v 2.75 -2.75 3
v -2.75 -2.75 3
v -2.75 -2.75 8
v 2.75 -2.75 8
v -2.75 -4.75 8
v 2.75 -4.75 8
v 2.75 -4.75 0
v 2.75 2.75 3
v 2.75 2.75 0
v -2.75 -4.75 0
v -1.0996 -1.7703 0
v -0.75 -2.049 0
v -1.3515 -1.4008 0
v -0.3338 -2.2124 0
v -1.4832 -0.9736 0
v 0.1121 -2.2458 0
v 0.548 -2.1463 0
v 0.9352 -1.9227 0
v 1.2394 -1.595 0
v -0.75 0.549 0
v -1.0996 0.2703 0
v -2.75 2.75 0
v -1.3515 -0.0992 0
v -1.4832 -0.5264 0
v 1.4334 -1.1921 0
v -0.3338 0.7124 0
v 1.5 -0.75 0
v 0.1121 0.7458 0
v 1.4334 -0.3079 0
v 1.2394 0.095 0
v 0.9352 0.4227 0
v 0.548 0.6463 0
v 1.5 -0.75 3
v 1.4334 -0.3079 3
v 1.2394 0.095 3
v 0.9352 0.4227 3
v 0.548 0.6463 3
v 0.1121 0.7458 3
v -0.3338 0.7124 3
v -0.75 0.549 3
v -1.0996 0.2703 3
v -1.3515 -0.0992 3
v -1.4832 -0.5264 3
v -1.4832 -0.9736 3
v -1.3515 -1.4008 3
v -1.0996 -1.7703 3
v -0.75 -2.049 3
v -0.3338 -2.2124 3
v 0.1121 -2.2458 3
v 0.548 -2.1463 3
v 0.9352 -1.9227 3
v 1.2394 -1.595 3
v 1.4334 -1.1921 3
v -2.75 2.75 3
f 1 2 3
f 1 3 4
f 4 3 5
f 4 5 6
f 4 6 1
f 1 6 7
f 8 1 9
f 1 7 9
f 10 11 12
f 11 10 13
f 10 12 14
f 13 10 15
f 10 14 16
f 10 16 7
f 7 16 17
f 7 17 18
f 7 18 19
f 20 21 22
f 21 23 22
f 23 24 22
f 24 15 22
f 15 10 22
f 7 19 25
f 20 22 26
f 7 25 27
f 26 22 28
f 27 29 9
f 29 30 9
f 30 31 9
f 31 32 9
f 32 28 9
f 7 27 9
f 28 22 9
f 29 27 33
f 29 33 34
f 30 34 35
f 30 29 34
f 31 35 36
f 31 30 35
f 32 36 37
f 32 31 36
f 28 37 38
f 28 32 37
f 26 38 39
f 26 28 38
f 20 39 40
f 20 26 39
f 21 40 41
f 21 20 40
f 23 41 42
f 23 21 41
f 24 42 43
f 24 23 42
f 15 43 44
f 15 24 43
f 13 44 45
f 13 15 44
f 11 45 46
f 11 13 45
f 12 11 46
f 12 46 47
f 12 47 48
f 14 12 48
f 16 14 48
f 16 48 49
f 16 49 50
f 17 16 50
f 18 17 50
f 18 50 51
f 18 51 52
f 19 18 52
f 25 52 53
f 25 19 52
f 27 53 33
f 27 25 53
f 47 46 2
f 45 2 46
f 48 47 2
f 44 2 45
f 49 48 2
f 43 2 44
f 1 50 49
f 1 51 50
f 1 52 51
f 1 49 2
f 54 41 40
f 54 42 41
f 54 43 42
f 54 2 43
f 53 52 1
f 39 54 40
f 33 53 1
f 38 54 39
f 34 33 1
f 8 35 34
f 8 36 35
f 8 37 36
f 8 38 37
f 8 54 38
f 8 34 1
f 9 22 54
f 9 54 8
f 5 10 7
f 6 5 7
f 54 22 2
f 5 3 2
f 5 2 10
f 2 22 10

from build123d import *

# Parameters (mm, degrees)
F0_W     = 5.5
F0_H     = 5.5
F0_R     = 1.5
F0_H_2   = 2
F1_DEPTH = 3
F2_DEPTH = 8


with BuildPart() as f1:
    # F0 (on Top) → F1 (new body)
    with BuildSketch(Plane.XY):
        Rectangle(F0_W, F0_H)
        with Locations((0, -0.75)):
            Circle(F0_R, mode=Mode.SUBTRACT)
        with Locations((0, -3.75)):
            Rectangle(F0_W, F0_H_2)
    extrude(amount=F1_DEPTH)

    # F0 (on Top) → F2 (join)
    with BuildSketch(Plane.XY):
        with Locations((0, -3.75)):
            Rectangle(F0_W, F0_H_2)
    extrude(amount=F2_DEPTH)


solid = f1.part
